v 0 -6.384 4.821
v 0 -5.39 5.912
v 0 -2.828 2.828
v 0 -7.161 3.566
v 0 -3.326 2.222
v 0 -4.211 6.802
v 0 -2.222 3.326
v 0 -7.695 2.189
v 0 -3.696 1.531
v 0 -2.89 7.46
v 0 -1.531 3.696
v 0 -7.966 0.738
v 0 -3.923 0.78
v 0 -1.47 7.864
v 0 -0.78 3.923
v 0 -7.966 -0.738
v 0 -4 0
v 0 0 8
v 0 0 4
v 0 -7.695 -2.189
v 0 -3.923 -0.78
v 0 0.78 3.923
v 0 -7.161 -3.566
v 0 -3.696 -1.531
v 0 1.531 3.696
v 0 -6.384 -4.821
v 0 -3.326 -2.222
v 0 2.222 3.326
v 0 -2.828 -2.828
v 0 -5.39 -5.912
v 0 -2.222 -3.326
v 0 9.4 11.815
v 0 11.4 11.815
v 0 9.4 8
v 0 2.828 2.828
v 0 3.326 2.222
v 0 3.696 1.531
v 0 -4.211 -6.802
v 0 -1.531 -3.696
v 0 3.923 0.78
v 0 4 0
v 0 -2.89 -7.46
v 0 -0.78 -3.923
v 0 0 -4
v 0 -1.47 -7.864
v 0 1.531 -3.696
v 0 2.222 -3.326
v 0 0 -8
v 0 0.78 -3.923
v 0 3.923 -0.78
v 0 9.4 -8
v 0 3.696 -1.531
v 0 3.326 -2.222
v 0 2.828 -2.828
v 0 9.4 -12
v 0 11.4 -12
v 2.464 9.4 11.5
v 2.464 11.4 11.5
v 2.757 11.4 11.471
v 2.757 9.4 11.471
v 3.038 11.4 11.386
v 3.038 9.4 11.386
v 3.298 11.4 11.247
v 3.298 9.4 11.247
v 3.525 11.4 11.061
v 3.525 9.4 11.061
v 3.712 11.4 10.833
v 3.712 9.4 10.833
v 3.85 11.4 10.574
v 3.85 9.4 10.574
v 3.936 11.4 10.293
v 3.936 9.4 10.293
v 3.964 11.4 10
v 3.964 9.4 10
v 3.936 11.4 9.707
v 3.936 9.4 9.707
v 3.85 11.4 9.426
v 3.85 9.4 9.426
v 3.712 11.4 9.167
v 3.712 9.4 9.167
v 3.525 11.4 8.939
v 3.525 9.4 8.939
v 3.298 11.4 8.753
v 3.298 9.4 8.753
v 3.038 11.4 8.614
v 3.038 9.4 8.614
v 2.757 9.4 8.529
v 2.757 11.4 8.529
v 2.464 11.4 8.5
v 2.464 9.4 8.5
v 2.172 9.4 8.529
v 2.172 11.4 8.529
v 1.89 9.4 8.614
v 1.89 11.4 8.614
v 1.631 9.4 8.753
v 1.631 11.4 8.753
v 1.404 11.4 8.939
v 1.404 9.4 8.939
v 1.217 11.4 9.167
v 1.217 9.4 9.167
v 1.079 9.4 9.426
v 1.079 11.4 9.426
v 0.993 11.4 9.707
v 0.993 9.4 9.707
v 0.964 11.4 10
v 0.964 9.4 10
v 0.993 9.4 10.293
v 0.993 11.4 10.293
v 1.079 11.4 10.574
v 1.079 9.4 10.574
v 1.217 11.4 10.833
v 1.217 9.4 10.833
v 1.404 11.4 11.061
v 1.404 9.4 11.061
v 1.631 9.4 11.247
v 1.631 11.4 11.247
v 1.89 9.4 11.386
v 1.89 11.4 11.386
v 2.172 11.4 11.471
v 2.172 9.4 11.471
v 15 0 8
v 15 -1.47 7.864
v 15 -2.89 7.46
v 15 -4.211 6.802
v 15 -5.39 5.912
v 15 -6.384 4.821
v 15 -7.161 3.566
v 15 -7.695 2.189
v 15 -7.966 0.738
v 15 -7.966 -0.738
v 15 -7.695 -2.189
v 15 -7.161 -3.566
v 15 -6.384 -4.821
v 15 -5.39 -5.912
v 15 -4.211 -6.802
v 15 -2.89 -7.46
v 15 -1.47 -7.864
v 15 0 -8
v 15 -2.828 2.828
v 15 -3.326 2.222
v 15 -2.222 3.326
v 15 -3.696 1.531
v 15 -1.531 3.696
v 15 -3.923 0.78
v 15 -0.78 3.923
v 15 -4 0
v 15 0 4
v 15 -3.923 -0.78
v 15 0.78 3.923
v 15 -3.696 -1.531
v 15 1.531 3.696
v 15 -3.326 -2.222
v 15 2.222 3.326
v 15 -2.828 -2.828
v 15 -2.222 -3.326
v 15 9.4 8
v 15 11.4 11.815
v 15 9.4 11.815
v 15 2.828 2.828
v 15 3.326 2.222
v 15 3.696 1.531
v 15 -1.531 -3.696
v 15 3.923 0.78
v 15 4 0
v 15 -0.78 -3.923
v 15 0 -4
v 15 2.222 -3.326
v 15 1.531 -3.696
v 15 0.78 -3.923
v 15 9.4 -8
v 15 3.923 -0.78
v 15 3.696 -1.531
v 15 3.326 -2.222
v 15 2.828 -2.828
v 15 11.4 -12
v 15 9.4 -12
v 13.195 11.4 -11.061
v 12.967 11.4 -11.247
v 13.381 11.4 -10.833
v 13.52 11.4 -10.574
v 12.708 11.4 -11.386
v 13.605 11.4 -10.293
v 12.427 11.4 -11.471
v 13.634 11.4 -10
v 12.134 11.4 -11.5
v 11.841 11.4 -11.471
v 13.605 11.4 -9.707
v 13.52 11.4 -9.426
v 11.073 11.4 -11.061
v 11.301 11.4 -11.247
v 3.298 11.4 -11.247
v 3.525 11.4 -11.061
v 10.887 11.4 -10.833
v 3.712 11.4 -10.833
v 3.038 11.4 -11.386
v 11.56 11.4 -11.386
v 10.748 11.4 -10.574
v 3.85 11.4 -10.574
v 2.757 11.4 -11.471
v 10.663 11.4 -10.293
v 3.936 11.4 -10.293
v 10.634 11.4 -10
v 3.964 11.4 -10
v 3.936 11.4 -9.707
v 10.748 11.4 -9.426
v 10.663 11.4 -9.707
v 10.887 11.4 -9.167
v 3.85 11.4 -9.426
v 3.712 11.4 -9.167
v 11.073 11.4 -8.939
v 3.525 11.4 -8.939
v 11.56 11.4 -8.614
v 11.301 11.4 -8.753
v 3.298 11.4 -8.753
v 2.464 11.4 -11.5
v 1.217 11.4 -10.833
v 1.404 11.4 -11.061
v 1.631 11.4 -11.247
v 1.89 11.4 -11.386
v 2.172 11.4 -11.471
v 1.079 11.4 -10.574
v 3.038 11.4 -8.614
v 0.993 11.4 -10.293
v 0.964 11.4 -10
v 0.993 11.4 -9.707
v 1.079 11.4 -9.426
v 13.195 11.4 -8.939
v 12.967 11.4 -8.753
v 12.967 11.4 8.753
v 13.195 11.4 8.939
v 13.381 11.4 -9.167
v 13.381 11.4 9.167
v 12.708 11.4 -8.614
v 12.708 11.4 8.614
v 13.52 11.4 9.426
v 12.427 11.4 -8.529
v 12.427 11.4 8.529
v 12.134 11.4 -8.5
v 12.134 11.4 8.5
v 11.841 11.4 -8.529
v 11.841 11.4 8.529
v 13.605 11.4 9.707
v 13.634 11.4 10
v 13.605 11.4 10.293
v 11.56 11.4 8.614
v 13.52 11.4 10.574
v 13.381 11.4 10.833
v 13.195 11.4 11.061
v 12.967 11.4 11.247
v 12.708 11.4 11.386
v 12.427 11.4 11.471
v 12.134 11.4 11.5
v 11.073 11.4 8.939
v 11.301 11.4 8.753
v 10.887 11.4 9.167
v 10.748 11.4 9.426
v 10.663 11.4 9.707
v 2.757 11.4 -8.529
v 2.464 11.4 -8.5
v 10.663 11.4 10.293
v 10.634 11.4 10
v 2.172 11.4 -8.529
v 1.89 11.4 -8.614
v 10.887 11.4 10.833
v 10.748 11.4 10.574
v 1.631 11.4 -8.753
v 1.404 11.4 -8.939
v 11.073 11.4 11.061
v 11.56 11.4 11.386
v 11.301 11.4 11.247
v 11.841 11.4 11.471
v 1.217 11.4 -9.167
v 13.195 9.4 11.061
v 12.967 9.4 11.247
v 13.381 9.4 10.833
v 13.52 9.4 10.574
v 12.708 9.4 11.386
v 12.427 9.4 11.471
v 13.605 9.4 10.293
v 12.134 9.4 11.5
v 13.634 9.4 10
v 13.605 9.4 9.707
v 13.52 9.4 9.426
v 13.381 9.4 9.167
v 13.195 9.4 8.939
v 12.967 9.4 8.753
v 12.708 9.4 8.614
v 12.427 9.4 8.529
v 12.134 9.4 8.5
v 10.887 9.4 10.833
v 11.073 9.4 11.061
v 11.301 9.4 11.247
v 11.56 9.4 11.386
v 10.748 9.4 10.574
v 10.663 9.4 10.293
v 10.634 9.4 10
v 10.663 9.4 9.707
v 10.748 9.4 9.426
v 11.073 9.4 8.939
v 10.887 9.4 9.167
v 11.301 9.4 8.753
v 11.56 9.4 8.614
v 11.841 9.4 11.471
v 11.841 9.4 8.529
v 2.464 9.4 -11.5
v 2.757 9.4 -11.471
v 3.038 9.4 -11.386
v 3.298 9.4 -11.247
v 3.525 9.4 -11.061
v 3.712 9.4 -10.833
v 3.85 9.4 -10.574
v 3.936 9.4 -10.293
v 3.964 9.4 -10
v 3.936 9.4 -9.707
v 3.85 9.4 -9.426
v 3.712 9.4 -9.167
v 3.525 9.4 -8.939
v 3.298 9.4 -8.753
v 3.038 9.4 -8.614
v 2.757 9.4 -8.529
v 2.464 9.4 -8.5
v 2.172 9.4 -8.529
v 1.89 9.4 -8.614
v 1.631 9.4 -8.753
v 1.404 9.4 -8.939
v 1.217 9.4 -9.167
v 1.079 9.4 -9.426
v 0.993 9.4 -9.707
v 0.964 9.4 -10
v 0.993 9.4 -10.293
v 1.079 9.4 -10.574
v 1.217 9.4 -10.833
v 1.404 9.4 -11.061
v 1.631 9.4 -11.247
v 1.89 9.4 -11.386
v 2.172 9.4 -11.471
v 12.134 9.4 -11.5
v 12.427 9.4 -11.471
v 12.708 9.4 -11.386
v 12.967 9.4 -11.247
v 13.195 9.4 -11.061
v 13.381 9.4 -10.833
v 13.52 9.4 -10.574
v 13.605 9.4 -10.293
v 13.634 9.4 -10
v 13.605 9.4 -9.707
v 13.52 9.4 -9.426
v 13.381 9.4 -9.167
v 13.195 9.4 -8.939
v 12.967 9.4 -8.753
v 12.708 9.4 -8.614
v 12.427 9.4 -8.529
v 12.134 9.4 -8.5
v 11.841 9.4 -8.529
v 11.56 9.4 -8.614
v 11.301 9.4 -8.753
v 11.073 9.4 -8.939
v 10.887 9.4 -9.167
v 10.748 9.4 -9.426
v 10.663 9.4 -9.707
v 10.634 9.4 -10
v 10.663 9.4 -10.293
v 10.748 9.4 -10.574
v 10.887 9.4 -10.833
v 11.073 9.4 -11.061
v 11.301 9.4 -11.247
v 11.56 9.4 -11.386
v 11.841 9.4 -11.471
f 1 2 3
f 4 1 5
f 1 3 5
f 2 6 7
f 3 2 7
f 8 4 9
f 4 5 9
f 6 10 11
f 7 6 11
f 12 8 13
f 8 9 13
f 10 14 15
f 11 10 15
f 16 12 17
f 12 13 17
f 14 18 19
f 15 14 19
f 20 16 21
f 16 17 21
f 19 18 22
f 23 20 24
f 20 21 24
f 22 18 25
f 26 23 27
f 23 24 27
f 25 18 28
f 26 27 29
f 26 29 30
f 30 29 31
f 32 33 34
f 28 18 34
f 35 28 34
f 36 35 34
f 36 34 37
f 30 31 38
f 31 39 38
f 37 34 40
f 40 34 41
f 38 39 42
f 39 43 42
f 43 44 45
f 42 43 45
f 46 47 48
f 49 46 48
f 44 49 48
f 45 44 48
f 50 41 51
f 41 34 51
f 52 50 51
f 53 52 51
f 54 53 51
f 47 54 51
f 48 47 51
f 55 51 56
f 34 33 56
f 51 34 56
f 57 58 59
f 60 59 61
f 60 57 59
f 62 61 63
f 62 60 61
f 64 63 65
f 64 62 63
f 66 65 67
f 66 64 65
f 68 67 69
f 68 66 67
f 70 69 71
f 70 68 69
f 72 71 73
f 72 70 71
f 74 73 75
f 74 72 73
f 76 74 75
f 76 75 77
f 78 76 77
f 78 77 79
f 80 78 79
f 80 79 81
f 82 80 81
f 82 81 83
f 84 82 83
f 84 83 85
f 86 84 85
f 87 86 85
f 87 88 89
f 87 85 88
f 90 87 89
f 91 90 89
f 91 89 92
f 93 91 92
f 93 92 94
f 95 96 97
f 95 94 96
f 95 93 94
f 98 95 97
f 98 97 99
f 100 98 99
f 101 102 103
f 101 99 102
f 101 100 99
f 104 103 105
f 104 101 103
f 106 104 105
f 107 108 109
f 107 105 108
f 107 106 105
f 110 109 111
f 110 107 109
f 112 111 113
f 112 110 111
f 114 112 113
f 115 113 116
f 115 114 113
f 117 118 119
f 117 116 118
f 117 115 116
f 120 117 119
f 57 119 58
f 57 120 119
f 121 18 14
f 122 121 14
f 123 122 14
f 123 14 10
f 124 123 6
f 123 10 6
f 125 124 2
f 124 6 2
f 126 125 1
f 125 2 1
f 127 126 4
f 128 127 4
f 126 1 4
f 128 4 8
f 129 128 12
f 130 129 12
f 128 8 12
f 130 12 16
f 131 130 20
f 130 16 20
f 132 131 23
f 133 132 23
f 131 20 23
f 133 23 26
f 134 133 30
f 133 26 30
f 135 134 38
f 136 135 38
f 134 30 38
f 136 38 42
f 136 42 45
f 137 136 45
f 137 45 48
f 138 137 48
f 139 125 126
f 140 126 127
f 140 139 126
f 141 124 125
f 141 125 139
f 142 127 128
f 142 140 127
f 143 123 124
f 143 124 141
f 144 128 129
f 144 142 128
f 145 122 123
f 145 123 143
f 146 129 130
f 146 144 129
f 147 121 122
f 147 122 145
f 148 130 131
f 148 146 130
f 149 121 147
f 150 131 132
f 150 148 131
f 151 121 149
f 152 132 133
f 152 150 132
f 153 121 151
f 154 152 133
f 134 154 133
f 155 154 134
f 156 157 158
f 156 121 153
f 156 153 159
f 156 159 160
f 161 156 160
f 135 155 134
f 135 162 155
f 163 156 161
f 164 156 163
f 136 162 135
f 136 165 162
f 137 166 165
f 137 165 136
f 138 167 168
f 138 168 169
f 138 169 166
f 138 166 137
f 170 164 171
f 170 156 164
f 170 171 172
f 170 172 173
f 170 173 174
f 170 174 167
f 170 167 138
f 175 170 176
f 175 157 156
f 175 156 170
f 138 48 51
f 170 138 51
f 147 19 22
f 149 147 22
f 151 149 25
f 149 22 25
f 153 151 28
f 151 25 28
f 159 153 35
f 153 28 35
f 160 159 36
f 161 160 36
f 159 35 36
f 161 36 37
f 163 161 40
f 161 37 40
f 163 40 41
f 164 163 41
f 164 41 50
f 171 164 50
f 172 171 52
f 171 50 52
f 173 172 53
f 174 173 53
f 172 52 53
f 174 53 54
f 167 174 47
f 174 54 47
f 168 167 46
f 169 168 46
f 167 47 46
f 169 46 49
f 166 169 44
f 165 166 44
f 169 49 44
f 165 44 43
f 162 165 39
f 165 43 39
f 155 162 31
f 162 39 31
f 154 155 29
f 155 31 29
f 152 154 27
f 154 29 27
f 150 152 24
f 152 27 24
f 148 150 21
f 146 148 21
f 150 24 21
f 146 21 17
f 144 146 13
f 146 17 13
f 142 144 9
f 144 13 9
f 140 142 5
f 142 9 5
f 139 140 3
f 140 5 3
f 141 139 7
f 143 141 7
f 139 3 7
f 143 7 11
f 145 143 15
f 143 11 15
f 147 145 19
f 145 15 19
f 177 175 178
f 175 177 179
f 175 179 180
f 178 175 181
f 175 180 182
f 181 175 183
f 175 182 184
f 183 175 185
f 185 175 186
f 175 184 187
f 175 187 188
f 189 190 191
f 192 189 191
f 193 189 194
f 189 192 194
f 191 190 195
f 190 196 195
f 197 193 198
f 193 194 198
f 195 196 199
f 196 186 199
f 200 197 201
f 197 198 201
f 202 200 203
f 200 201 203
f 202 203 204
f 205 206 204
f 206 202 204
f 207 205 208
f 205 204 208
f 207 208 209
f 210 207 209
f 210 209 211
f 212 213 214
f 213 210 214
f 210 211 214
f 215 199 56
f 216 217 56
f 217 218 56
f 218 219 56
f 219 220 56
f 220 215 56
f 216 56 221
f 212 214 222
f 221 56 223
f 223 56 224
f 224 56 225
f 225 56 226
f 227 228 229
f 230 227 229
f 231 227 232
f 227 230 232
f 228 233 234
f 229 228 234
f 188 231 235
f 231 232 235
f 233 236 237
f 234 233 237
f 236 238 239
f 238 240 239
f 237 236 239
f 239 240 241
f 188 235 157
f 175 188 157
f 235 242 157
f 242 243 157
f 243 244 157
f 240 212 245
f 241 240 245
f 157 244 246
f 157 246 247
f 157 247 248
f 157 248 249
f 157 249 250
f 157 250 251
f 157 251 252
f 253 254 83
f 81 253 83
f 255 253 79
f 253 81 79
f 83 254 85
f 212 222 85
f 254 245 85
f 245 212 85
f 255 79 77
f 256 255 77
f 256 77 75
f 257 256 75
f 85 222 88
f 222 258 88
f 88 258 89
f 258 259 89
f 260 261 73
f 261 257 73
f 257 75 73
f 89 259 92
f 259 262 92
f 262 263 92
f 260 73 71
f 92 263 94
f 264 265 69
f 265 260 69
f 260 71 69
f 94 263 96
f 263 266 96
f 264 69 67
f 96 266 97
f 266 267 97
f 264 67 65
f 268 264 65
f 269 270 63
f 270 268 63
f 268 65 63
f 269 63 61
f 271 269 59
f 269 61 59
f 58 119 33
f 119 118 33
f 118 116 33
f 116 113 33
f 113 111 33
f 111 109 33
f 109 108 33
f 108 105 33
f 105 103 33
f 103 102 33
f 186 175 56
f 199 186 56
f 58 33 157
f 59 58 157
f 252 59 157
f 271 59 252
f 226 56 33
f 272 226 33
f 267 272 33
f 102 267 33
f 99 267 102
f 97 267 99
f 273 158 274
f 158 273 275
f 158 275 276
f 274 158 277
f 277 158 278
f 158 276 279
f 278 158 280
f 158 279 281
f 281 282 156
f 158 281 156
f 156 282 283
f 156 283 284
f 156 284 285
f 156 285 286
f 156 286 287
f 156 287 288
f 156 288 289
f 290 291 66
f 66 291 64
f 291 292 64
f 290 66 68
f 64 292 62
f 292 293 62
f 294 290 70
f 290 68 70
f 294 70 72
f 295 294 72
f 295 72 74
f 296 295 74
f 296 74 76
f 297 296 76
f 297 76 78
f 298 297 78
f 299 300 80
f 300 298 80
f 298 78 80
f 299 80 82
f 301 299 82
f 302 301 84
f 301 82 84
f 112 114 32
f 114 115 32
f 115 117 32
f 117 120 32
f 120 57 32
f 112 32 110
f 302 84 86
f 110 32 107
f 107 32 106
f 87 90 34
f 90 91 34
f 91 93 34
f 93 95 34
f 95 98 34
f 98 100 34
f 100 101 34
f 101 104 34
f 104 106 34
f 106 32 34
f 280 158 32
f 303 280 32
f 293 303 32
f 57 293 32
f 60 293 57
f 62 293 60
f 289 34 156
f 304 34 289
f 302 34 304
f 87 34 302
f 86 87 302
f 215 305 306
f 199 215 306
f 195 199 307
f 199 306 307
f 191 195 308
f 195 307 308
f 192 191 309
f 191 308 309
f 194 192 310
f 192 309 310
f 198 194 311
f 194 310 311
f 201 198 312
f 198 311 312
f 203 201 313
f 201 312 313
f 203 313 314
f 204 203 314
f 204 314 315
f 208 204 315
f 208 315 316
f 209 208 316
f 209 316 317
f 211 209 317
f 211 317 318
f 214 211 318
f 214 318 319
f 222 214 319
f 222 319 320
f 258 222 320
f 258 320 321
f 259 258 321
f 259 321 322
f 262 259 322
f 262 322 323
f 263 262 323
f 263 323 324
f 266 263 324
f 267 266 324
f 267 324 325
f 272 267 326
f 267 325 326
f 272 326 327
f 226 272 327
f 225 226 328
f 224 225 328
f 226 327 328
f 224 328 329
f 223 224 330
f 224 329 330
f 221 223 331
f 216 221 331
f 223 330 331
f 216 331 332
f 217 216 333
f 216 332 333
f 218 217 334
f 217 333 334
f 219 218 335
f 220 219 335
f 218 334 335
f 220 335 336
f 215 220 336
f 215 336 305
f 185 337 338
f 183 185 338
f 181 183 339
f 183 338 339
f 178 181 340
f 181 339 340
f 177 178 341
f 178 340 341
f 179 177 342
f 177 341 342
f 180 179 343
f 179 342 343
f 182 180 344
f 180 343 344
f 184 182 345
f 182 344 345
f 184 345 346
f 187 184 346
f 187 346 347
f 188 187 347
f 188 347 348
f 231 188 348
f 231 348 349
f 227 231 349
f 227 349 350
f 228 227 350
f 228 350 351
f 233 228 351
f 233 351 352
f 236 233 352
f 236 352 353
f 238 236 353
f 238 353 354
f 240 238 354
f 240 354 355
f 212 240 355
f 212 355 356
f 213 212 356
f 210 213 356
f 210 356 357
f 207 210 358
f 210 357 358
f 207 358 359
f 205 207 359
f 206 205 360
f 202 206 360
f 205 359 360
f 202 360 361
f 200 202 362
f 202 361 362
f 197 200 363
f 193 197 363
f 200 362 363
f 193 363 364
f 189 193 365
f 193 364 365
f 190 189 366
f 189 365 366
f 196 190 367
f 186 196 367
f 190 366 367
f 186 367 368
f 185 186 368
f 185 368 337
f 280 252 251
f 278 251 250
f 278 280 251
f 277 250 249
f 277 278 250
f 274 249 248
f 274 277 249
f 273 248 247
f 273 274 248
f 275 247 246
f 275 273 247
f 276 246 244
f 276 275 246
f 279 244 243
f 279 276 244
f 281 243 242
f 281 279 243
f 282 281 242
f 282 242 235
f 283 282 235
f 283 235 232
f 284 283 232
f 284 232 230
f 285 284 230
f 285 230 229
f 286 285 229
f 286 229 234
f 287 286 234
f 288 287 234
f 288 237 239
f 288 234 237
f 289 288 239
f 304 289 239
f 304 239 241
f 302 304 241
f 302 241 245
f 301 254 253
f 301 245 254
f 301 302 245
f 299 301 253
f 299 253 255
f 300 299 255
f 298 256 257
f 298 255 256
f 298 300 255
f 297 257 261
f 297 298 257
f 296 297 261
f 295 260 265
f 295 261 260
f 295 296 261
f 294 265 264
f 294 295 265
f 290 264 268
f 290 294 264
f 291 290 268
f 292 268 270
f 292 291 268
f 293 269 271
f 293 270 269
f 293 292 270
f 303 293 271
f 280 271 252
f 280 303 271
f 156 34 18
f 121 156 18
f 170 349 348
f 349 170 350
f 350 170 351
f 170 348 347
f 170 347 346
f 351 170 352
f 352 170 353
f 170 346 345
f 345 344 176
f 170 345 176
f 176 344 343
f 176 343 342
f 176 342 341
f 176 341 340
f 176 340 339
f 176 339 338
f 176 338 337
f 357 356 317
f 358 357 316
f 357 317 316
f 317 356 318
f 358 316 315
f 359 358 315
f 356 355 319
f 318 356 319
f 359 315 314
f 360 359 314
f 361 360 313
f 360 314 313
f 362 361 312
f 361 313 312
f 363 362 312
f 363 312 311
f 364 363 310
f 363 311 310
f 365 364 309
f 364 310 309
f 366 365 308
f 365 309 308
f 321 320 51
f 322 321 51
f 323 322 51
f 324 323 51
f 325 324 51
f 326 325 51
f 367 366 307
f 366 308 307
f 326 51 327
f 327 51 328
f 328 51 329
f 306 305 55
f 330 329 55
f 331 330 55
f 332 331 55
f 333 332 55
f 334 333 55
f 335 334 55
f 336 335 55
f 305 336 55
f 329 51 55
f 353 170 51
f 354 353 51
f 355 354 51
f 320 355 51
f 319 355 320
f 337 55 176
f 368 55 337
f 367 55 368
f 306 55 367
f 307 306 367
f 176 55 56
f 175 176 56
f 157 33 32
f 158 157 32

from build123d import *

# Parameters (mm, degrees)
BOSS_EXTRUDE1_DEPTH = 15
SKETCH3_R           = 1.5
CUT_EXTRUDE1_DEPTH  = 15


with BuildPart() as part:
    # Sketch2 → Boss-Extrude1 (new body)
    with BuildSketch(Plane(origin=(0, 0, 0), x_dir=(0, 0, -1), z_dir=(1, 0, 0))):
        with BuildLine():
            Line((8, 11.4), (-7.814981045, 11.4))
            Line((-7.814981045, 11.4), (-11.814981045, 11.4))
            Line((-11.814981045, 11.4), (-11.814981045, 9.4))
            Line((-11.814981045, 9.4), (-8, 9.4))
            Line((-8, 9.4), (-8, 0))
            ThreePointArc((-8, 0), (0, -8), (8, 0))
            Line((8, 0), (8, 9.4))
            Line((8, 9.4), (12, 9.4))
            Line((12, 9.4), (12, 11.4))
            Line((12, 11.4), (8, 11.4))
        make_face()
        with BuildLine():
            ThreePointArc((4, 0), (0, -4), (-4, 0))
            ThreePointArc((-4, 0), (0, 4), (4, 0))
        make_face(mode=Mode.SUBTRACT)
    extrude(amount=BOSS_EXTRUDE1_DEPTH)

    # Sketch3 → Cut-Extrude1 (cut)
    with BuildSketch(Plane.XZ.offset(-9.4)):
        with Locations(Location((2.464362638, -10, 0), (0, 0, 270))):
            Circle(SKETCH3_R)
        with Locations(Location((12.134124748, -10, 0), (0, 0, 270))):
            Circle(SKETCH3_R)
    cut_extrude1 = extrude(amount=-CUT_EXTRUDE1_DEPTH, mode=Mode.SUBTRACT)

    # Mirror1: Cut-Extrude1 across plane
    add(cut_extrude1.mirror(Plane.XY), mode=Mode.SUBTRACT)


solid = part.part
